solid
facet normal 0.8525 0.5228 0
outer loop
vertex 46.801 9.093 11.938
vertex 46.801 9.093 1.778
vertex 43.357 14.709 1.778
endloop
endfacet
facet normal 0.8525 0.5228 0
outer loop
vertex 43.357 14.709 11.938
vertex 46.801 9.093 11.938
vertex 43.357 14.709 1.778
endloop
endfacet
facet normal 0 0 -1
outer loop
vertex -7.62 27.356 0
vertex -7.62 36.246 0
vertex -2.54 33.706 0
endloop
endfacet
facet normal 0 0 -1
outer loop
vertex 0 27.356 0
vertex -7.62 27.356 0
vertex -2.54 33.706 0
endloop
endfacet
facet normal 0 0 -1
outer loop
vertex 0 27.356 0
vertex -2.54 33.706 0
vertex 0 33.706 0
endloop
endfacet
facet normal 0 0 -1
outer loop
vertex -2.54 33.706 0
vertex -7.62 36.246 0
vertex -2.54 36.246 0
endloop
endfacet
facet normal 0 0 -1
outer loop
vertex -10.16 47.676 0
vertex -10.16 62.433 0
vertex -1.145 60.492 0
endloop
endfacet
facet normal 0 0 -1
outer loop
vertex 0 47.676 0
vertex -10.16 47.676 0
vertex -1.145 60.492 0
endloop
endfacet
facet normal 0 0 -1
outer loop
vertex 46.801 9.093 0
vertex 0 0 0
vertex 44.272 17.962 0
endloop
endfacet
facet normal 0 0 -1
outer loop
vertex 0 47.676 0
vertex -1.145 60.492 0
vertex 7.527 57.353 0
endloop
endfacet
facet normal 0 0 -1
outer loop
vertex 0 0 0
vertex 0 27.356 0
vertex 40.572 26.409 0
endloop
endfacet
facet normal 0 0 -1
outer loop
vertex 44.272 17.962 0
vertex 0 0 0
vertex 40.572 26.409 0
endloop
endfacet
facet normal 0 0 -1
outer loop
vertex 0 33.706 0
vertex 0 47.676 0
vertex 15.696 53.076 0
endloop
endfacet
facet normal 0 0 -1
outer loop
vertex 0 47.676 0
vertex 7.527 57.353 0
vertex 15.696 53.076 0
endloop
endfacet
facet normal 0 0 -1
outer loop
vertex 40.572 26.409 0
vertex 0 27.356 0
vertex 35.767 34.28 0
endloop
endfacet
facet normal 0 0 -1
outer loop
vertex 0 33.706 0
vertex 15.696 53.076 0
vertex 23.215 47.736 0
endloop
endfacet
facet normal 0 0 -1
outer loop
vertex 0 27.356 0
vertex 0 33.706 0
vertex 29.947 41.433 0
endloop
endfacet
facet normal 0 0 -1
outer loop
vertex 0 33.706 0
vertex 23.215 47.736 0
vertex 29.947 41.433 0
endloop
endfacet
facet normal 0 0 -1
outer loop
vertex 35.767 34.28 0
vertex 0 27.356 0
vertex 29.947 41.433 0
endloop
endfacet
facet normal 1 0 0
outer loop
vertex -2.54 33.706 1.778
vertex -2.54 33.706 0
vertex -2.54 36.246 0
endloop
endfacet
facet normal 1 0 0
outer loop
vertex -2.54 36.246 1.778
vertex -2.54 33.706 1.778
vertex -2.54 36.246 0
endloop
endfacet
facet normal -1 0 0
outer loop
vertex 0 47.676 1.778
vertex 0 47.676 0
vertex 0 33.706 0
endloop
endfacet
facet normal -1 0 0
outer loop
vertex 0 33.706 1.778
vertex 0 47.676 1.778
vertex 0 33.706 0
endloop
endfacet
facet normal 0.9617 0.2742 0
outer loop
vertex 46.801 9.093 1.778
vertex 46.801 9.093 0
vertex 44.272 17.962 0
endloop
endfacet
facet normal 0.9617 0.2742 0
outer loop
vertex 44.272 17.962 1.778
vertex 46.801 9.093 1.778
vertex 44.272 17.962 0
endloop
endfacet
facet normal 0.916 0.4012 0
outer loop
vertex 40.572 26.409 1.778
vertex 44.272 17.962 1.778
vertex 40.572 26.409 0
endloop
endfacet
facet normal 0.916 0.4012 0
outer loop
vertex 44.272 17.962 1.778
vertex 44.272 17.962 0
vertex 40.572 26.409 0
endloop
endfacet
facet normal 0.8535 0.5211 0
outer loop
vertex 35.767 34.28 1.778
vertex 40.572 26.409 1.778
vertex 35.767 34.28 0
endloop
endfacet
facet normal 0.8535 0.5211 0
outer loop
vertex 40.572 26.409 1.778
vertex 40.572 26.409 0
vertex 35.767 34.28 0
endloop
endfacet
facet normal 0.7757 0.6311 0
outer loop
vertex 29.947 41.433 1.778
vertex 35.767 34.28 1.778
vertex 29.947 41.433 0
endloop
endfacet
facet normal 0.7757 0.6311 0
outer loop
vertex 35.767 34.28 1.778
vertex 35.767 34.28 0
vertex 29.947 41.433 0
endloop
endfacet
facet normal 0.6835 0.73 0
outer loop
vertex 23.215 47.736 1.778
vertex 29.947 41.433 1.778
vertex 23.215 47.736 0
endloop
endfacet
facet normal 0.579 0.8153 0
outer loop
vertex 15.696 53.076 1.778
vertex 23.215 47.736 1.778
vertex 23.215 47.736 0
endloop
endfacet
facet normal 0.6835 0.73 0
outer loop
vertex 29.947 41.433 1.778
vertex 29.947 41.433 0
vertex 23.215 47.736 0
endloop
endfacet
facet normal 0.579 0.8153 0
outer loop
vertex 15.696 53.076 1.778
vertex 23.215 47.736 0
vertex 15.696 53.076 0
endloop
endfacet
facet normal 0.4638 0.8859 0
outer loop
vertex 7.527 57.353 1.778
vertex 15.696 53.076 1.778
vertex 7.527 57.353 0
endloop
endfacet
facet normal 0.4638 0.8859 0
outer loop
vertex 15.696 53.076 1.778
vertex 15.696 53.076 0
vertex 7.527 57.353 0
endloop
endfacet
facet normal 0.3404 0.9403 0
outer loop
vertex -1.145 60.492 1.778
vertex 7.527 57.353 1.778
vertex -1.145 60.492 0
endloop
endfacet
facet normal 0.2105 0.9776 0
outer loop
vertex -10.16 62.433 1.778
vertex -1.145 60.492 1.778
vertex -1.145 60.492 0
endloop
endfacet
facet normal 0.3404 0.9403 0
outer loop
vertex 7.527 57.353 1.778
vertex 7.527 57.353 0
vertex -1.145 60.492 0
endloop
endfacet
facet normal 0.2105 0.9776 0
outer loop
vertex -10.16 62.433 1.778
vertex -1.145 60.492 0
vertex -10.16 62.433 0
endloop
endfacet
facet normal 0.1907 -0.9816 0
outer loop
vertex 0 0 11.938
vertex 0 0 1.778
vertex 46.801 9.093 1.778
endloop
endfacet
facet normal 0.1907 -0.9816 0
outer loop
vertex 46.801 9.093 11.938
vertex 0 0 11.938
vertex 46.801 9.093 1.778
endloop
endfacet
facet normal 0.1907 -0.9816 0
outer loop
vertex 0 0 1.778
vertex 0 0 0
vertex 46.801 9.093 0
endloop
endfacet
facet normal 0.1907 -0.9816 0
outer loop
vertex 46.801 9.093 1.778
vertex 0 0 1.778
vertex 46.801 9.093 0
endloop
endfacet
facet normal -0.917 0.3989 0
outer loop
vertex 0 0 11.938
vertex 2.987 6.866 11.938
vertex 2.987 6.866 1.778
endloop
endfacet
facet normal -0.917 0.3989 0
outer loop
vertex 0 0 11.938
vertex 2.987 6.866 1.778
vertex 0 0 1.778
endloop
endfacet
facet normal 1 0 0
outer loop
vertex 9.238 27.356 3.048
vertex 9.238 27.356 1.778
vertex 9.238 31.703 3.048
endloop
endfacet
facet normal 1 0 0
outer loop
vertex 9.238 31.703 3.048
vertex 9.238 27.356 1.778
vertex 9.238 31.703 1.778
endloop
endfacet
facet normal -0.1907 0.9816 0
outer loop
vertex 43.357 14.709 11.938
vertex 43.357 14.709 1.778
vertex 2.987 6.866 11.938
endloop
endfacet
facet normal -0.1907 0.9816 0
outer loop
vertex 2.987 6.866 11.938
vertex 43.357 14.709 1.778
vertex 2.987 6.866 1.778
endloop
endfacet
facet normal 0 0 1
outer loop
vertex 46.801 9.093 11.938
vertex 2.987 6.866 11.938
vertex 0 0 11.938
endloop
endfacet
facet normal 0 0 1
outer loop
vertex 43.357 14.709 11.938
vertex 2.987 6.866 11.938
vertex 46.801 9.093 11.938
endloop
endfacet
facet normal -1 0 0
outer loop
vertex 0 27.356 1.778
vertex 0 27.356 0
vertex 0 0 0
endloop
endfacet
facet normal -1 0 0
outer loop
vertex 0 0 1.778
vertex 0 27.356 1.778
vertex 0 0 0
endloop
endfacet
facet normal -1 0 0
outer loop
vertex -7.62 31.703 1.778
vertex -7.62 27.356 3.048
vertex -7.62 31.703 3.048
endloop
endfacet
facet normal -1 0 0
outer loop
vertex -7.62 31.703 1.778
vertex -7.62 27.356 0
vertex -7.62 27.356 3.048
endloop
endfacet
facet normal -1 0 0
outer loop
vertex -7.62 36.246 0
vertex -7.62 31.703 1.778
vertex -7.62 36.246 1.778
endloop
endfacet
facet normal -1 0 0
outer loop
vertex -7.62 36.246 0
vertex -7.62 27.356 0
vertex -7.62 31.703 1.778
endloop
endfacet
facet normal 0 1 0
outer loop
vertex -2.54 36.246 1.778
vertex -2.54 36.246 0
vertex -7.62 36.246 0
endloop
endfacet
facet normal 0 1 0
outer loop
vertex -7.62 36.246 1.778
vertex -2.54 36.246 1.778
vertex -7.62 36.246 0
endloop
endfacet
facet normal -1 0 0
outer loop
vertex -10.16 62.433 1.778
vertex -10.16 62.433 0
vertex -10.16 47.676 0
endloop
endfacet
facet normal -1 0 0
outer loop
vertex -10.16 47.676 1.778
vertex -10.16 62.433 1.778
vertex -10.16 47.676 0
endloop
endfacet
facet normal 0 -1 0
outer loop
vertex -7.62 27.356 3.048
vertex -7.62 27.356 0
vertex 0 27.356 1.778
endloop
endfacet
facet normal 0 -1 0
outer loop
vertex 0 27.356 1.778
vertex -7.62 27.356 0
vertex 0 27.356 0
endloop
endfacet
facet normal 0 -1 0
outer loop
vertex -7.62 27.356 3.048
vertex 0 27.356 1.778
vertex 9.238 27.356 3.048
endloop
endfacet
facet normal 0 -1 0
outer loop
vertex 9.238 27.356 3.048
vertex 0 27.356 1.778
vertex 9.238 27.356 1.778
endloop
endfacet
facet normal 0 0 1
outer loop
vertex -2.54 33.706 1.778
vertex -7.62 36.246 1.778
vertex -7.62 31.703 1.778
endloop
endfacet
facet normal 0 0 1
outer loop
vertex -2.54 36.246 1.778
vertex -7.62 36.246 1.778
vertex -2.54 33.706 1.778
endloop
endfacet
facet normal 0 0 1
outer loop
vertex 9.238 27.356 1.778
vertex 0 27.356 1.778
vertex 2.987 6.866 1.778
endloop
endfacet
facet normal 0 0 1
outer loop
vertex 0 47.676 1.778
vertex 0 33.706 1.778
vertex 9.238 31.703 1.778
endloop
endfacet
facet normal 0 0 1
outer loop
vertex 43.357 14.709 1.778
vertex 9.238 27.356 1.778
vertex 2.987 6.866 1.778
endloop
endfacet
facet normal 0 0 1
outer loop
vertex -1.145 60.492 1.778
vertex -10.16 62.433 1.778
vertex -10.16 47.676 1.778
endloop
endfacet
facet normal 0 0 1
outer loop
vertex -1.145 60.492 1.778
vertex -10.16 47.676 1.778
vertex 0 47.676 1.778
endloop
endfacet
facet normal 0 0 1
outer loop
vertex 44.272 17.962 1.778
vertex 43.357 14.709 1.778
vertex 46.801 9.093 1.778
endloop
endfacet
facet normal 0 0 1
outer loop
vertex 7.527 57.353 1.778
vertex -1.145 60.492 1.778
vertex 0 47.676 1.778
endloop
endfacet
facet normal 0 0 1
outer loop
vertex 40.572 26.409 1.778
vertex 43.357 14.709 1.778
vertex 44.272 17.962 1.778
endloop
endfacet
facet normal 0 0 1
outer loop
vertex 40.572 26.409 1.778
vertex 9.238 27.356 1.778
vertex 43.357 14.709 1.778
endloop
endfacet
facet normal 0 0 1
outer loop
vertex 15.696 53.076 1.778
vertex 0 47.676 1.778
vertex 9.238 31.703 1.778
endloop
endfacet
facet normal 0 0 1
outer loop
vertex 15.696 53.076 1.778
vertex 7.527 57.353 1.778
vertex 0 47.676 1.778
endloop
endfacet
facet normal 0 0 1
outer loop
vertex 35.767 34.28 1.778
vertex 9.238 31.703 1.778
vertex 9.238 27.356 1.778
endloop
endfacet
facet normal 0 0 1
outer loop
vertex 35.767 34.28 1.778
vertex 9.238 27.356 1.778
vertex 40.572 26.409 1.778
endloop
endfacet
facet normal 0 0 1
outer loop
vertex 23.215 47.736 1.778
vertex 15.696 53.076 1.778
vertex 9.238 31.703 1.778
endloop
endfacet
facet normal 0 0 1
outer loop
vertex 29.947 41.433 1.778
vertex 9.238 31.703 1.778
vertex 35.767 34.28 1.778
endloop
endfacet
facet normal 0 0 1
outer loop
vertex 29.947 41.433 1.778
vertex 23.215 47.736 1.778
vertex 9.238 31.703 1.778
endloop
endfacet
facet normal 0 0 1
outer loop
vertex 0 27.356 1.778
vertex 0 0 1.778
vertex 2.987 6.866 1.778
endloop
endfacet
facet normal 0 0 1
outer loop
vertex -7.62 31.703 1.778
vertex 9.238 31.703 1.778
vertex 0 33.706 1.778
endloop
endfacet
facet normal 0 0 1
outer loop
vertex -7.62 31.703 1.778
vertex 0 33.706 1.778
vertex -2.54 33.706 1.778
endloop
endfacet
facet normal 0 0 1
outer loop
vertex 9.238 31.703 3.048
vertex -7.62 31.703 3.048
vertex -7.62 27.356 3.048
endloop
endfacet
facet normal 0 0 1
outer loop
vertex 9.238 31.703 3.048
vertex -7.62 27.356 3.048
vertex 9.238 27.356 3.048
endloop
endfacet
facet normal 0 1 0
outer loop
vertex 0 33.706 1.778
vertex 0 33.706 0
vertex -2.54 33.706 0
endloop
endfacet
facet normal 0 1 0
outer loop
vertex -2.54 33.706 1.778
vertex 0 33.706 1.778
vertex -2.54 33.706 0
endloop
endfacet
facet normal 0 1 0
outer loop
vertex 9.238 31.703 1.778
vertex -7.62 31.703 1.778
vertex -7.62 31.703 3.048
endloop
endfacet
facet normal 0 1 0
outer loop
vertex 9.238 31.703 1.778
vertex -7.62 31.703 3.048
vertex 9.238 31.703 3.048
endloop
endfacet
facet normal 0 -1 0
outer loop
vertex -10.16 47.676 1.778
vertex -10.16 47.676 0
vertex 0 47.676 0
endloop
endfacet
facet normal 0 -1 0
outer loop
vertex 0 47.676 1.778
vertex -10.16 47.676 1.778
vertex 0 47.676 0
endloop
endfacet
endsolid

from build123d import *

# Parameters (mm, degrees)
F1_DEPTH = 1.778
F3_DEPTH = 10.16
F4_W     = 16.85848
F4_H     = 4.34721
F5_DEPTH = 1.27


with BuildPart() as f1:
    # F0 (on Top) → F1 (new body)
    with BuildSketch(Plane.XY):
        with BuildLine():
            Line((0, 27.3558), (0, 0))
            Line((0, 0), (46.800594, 9.0932))
            ThreePointArc((46.800594, 9.0932), (26.687452, 44.698298), (-10.16, 62.4332))
            Line((-10.16, 62.4332), (-10.16, 47.6758))
            Line((-10.16, 47.6758), (0, 47.6758))
            Line((0, 47.6758), (0, 33.7058))
            Line((0, 33.7058), (-2.54, 33.7058))
            Line((-2.54, 33.7058), (-2.54, 36.2458))
            Line((-2.54, 36.2458), (-7.62, 36.2458))
            Line((-7.62, 36.2458), (-7.62, 27.3558))
            Line((-7.62, 27.3558), (0, 27.3558))
        make_face()
    extrude(amount=F1_DEPTH)

    # F2 (on face) → F3 (join)
    with BuildSketch(Plane.XY.offset(1.778)):
        Polygon((2.986613, 6.865549), (0, 0), (46.800594, 9.0932), (43.356929, 14.709367), align=None)
    extrude(amount=F3_DEPTH)

    # F4 (on face) → F5 (join)
    with BuildSketch(Plane.XY.offset(1.778)):
        with Locations((0.80924, 29.529405)):
            Rectangle(F4_W, F4_H)
    extrude(amount=F5_DEPTH)


solid = f1.part
